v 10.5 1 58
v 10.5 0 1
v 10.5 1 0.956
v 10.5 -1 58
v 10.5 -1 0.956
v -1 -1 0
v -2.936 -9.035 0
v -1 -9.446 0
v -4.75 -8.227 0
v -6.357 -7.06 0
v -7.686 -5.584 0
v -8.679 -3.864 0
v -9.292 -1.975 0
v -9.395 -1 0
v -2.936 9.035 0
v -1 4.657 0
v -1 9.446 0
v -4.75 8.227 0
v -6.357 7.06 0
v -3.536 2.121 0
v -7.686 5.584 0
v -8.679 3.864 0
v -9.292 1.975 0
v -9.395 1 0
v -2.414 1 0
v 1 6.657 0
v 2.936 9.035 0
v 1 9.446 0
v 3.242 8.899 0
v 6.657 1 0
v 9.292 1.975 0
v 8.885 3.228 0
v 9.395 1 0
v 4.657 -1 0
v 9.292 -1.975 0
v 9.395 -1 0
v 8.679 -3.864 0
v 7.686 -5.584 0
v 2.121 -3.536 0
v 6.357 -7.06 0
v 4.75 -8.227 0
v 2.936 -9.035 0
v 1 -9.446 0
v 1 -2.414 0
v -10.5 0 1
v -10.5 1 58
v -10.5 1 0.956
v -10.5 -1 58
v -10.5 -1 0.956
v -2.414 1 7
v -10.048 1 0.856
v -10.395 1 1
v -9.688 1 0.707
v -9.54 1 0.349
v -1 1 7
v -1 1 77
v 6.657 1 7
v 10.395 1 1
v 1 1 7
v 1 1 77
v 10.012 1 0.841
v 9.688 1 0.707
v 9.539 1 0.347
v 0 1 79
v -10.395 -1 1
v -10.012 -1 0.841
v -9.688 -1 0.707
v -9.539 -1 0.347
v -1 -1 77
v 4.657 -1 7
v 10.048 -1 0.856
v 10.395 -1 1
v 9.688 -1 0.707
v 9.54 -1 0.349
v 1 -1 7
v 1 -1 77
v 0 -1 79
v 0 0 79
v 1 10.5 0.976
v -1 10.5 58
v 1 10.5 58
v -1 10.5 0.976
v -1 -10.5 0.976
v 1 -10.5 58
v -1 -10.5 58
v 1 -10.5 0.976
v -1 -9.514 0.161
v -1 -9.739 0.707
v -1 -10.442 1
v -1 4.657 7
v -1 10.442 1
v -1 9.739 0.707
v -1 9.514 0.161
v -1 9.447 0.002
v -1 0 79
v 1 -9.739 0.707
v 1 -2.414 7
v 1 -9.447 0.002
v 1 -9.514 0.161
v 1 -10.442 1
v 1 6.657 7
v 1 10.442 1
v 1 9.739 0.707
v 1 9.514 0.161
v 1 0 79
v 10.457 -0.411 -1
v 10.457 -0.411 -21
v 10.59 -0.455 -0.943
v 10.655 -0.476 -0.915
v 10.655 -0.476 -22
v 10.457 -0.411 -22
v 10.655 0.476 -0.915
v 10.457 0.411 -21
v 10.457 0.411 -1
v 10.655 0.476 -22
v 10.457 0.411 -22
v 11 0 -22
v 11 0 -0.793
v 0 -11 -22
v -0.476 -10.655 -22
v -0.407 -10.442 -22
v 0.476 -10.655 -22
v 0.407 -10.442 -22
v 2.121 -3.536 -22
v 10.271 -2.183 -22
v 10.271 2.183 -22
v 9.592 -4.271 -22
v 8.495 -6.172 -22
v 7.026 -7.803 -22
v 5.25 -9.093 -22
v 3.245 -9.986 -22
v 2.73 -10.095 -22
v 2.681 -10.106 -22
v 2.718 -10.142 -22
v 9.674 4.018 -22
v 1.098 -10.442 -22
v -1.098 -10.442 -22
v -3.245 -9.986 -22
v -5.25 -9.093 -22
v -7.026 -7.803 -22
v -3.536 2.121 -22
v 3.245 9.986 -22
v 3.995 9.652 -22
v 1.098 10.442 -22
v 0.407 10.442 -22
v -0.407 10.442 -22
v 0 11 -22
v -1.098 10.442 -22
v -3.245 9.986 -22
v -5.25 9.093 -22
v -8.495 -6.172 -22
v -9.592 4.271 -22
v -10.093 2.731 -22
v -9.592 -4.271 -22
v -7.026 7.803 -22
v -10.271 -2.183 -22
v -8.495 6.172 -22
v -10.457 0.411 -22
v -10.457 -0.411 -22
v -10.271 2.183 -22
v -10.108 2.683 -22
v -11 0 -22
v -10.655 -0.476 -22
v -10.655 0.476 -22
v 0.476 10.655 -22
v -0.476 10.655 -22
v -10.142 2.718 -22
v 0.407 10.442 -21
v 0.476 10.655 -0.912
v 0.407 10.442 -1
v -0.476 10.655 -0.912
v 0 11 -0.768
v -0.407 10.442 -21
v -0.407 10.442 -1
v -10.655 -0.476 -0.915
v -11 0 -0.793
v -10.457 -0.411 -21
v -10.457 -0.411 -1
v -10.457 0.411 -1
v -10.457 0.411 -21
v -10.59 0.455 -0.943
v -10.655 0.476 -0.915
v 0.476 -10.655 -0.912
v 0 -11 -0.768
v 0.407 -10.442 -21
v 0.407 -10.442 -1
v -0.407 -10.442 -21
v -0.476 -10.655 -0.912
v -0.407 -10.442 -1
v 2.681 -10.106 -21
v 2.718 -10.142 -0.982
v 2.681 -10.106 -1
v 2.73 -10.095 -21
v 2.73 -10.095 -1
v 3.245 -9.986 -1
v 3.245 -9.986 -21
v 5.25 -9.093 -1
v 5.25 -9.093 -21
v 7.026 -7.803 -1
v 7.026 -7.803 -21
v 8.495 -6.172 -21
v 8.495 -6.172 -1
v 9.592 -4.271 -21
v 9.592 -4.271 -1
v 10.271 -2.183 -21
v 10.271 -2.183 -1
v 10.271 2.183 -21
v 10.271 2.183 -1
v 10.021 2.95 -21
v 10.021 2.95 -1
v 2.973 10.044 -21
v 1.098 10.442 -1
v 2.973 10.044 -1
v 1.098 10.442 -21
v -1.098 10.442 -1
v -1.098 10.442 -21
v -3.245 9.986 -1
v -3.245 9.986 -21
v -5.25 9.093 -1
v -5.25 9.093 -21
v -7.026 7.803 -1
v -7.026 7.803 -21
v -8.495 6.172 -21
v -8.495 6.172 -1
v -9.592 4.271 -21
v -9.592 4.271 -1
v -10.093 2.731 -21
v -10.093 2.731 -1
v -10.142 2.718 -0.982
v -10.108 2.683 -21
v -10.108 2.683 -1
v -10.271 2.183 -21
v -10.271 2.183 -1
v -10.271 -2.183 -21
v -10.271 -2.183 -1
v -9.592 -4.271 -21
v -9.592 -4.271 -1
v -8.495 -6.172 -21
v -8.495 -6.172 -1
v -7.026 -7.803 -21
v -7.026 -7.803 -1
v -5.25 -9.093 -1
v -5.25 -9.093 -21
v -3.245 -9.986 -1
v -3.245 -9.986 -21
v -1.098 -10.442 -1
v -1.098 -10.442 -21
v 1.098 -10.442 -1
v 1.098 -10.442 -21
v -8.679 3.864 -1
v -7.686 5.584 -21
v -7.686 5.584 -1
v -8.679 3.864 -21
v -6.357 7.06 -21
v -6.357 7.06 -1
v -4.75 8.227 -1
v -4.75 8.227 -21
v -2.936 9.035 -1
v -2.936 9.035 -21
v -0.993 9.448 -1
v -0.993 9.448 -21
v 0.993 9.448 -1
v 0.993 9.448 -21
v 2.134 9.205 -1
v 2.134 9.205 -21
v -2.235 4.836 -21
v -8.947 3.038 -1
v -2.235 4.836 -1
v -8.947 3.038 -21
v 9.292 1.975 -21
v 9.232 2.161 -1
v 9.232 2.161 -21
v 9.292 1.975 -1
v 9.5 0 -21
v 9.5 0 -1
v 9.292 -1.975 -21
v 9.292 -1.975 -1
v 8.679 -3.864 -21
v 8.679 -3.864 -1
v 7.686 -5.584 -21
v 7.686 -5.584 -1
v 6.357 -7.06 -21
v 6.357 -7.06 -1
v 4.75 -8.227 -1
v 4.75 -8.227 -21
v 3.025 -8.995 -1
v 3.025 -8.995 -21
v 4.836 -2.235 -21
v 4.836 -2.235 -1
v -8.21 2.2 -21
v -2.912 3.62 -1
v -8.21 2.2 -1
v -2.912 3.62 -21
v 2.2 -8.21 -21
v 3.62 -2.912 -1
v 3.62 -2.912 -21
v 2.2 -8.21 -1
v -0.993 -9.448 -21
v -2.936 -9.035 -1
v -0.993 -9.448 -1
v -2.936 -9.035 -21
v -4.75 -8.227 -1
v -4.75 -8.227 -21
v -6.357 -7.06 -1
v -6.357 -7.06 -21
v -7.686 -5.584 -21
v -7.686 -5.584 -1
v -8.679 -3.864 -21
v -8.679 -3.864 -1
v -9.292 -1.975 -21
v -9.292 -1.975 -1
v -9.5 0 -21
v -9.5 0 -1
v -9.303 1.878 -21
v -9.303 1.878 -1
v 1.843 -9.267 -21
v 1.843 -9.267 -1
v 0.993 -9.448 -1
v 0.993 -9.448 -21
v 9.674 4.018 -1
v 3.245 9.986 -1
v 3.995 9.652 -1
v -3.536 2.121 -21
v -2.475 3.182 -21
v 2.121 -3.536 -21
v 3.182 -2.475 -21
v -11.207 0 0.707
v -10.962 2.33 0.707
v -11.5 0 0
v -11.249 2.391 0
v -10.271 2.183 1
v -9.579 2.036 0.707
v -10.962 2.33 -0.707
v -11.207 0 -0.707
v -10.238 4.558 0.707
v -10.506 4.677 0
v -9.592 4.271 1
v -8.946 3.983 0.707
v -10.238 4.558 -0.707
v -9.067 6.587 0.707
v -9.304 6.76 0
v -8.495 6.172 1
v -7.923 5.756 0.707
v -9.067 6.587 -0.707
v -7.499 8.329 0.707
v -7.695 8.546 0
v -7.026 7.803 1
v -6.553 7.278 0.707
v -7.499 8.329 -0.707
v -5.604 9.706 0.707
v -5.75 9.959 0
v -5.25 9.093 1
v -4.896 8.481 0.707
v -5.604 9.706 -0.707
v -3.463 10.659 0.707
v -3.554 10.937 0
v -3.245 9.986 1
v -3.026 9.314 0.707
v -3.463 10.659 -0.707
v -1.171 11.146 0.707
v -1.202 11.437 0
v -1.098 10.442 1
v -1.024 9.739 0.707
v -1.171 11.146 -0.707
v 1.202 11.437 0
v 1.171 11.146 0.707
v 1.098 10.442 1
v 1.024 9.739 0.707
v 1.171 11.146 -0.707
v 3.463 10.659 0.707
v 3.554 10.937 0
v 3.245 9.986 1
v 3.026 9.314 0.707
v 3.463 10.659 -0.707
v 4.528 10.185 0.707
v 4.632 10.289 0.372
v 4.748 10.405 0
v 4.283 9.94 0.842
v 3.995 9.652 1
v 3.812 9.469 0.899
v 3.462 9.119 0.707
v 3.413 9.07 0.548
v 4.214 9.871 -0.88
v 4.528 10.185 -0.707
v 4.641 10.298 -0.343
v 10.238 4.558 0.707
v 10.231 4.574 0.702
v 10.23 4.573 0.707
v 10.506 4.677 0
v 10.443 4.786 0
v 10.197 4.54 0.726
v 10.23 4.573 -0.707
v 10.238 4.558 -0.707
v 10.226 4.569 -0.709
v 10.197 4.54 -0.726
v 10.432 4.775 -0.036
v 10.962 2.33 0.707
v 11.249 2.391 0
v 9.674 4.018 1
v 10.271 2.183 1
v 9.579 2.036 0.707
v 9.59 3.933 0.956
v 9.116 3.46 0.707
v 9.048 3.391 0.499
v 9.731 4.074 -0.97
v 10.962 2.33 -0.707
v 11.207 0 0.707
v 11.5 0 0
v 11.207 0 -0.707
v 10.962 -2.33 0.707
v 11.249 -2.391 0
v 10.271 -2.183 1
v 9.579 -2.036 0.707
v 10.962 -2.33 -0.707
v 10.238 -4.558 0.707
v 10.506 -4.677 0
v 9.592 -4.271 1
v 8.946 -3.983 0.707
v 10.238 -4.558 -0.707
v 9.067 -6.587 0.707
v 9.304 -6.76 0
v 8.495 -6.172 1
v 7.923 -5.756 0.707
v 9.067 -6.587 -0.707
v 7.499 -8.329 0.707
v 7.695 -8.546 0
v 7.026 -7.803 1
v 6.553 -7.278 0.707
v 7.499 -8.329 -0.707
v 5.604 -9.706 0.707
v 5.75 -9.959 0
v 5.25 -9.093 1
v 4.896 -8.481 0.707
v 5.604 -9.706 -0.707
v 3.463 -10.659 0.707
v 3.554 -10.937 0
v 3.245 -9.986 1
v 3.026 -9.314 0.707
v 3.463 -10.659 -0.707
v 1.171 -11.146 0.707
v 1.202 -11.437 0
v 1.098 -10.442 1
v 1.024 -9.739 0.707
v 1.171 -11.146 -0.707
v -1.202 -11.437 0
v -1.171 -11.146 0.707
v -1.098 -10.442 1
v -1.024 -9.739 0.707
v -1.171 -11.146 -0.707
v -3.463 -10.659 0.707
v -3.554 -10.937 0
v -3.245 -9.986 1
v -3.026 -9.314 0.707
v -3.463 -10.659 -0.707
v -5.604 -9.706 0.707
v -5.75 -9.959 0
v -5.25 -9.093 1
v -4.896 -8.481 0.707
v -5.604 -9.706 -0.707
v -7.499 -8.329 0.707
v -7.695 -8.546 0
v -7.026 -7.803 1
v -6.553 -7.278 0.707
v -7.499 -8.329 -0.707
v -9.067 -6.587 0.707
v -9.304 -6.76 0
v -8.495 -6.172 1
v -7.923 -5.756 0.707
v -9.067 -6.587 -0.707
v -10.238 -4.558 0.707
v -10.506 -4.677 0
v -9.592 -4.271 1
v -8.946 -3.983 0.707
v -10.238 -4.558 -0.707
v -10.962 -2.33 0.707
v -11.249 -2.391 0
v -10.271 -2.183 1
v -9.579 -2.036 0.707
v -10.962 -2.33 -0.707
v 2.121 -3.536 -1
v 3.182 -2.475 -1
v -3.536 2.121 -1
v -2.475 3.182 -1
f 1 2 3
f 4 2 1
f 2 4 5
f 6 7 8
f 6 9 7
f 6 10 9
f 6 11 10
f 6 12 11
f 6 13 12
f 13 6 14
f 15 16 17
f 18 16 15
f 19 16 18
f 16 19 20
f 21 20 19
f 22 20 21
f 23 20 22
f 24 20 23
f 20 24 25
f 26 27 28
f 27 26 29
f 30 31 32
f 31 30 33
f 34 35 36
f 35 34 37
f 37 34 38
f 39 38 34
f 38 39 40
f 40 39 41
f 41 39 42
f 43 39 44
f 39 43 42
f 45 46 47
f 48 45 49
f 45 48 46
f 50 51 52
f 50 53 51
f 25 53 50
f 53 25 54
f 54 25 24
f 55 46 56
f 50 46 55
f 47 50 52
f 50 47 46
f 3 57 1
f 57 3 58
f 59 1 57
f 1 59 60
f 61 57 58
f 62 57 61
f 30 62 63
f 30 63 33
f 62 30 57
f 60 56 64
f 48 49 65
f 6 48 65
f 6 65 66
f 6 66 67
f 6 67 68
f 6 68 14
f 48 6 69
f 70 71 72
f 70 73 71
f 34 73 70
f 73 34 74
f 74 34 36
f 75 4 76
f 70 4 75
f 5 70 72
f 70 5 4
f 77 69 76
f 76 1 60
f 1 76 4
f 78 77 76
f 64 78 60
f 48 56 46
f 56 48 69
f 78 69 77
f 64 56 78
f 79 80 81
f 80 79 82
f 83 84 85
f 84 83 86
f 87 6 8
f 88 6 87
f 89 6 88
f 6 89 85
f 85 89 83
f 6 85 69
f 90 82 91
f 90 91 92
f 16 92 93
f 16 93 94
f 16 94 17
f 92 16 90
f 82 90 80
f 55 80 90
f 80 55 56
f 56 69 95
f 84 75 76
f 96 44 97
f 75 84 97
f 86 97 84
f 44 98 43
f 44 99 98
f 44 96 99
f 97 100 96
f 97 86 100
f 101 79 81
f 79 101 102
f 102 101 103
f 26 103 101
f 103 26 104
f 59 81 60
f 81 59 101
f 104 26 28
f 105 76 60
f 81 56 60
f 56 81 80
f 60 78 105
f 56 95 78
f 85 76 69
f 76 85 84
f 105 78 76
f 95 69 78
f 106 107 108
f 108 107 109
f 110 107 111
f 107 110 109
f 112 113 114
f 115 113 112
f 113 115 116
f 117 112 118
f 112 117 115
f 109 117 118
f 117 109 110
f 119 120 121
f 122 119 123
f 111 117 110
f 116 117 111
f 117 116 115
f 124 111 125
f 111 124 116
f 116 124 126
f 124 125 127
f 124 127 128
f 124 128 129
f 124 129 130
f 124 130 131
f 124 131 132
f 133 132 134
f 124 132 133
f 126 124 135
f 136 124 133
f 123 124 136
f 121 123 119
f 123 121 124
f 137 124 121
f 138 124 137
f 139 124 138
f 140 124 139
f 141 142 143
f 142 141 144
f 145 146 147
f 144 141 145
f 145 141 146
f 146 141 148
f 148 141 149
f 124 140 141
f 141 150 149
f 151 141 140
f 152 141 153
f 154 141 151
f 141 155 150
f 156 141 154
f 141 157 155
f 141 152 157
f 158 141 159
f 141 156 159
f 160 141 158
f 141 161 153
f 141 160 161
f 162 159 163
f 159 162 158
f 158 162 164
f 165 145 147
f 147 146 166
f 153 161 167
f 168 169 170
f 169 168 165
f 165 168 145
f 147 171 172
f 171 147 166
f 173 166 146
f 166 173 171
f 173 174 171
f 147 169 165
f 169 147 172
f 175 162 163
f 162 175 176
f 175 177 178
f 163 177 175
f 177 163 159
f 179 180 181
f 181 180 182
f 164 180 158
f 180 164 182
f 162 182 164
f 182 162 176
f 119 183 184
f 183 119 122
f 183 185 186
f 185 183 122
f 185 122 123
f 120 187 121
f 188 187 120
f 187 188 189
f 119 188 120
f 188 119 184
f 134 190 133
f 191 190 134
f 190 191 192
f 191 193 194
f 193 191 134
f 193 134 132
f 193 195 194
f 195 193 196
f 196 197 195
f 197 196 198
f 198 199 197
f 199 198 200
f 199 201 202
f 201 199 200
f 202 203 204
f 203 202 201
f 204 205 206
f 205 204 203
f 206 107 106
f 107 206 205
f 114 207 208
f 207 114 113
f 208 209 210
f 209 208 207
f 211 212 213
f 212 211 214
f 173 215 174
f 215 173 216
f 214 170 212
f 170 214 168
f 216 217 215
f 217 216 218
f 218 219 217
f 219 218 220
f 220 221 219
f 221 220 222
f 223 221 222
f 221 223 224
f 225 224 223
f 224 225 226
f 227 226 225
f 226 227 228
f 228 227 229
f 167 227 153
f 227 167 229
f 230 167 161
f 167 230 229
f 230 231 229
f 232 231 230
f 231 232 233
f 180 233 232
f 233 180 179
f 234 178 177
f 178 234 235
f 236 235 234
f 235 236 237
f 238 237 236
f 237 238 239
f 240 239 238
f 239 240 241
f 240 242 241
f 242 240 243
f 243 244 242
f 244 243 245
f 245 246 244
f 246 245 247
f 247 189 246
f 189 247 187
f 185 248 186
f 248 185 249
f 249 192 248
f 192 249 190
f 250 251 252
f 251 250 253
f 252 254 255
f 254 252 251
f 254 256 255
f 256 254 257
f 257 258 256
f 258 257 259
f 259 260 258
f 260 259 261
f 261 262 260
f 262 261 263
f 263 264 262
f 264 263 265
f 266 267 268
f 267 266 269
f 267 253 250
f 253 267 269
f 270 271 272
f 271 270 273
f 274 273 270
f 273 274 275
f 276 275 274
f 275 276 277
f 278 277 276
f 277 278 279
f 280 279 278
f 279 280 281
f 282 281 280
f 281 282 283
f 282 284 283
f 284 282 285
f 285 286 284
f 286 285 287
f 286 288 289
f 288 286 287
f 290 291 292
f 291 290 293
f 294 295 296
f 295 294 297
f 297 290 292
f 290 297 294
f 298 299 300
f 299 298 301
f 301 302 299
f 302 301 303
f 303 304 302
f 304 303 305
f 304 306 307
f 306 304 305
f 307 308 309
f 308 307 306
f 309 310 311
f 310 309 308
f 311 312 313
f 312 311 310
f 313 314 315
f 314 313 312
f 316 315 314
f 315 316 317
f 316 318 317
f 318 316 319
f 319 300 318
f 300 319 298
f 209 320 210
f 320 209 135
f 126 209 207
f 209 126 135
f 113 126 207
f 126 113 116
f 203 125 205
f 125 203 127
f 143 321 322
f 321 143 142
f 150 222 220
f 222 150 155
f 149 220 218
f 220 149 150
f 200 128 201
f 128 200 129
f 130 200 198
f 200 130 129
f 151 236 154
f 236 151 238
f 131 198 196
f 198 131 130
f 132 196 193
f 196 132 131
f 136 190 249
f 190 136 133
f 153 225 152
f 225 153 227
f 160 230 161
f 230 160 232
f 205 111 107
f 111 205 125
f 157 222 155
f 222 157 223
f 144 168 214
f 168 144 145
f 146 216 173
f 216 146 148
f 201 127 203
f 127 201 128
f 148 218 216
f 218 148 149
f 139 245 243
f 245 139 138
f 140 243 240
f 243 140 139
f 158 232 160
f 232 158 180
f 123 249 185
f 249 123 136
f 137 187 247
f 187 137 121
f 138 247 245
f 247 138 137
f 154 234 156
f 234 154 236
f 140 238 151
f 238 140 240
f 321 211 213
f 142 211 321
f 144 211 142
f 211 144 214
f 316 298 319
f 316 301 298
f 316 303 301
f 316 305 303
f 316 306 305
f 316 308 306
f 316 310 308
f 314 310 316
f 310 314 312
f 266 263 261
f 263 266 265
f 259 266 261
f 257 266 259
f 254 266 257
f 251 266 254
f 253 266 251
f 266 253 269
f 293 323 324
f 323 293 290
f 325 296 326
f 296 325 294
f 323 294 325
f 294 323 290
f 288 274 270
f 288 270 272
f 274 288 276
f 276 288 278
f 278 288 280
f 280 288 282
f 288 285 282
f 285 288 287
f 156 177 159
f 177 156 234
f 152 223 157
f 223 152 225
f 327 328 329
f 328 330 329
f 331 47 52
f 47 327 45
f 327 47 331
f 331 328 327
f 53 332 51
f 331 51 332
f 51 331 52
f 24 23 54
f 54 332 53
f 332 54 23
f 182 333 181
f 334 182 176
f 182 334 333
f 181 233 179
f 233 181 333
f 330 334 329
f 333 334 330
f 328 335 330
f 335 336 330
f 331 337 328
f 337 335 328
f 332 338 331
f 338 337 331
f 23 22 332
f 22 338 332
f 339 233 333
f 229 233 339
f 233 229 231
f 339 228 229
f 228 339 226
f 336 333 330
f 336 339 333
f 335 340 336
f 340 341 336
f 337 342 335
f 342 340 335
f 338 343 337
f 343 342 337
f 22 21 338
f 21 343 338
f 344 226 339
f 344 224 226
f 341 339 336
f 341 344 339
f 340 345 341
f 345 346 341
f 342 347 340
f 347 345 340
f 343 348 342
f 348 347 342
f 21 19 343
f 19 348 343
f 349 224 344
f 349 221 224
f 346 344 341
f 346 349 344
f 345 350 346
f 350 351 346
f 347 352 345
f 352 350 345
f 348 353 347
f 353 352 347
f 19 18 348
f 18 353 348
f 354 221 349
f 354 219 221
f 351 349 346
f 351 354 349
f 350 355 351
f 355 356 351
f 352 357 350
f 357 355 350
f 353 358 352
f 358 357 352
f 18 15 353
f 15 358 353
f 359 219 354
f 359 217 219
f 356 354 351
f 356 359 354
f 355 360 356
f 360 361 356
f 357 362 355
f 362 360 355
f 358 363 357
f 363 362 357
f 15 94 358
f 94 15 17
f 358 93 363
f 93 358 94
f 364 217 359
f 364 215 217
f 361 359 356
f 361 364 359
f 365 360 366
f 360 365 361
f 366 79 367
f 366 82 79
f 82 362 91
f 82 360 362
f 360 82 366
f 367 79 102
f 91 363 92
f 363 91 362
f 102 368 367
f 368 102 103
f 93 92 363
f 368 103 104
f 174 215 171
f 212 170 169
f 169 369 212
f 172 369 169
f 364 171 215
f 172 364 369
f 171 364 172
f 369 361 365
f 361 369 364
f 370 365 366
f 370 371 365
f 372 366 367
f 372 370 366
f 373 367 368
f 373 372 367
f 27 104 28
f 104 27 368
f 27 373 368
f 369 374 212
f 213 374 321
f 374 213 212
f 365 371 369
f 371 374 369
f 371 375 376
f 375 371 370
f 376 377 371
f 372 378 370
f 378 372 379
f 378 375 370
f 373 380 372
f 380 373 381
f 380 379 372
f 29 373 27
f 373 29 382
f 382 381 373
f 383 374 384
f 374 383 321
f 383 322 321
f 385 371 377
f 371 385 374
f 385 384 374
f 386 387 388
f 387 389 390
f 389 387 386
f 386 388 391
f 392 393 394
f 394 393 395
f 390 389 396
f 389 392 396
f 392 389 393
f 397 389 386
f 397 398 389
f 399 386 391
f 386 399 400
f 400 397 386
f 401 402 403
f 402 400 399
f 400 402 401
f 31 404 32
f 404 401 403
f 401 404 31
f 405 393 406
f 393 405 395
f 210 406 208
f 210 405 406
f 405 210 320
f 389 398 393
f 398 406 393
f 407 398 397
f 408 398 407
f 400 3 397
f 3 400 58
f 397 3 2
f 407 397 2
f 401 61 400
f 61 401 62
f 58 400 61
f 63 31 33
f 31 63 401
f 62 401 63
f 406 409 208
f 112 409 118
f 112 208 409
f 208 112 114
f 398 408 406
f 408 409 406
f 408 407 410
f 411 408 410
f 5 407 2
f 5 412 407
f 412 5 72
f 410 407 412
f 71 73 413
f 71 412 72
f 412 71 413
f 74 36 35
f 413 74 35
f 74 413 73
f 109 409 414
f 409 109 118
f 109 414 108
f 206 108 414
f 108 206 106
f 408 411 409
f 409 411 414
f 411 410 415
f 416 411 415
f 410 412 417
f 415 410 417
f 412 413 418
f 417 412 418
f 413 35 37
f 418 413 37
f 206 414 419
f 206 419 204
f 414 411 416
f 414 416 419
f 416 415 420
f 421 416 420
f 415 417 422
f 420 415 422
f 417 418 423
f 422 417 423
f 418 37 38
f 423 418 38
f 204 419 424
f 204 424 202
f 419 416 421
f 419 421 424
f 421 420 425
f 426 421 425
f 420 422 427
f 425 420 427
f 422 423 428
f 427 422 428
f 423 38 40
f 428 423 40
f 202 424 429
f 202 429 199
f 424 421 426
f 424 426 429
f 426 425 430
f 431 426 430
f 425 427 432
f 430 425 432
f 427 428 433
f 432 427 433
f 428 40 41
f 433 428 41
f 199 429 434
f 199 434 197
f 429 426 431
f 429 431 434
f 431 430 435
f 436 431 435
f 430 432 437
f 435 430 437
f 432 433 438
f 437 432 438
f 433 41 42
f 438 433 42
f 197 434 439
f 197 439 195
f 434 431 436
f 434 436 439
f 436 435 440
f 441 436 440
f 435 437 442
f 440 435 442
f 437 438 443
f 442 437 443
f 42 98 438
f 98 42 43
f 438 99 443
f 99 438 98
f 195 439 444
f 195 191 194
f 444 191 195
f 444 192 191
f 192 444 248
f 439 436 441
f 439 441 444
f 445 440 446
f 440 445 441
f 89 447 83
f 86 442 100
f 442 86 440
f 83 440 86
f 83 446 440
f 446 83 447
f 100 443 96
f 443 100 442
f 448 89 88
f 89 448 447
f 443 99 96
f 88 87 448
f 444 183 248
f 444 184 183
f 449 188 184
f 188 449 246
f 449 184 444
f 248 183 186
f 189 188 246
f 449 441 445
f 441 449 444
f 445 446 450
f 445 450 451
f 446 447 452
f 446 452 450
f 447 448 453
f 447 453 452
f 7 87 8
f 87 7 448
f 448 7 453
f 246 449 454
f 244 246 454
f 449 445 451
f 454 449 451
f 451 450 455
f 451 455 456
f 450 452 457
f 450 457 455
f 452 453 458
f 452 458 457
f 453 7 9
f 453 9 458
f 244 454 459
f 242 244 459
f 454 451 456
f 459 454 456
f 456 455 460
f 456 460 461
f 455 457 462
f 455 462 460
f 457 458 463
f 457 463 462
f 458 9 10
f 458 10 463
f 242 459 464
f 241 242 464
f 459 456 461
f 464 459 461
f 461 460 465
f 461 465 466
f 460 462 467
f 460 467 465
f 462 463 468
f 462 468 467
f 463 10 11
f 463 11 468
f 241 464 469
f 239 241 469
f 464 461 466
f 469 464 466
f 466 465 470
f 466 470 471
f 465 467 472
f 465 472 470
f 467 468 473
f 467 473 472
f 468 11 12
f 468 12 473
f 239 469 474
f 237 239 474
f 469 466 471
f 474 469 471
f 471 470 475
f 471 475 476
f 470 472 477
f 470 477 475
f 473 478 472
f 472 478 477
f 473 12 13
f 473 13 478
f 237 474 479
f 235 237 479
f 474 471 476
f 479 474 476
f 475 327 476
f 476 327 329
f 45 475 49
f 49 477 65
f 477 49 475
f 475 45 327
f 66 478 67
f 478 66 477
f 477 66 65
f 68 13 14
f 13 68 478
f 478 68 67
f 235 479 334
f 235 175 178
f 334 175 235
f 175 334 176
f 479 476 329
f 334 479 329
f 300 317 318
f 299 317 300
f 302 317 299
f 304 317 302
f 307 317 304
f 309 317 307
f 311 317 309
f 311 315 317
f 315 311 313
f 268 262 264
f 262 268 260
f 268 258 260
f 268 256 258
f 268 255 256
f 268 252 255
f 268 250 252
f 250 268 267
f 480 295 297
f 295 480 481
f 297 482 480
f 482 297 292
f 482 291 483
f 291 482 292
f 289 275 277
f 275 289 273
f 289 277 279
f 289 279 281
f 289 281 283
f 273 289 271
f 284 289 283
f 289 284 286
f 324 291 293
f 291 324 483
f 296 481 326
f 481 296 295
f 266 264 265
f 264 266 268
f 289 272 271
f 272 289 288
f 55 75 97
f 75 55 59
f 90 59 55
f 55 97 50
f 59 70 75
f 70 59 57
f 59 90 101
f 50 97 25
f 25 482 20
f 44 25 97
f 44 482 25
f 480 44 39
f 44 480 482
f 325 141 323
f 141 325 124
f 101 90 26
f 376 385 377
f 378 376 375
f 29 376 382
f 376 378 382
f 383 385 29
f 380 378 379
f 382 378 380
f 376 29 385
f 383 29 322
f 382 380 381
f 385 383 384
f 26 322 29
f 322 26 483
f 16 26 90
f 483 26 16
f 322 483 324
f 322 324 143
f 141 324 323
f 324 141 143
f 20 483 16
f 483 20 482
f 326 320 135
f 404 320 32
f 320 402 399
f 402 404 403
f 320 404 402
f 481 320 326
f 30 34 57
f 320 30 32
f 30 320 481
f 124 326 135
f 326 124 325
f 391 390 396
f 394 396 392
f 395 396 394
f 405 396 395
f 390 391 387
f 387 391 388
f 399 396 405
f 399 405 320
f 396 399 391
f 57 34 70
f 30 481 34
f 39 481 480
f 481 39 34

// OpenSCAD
/*
    A ground spike for garden lights with a gap for electric cable to pass up the shaft.

    I bought some lovely solar powered garden light
    (Just for £2 - a bargain for a stainless steel and glass construction!)
    buy I also wanted wire them to a 12V supply, so they could illuminate the whole garden.
    The 12V cable is quite thick, and the existing ground spikes couldn't accomodate the cable.

Print Notes
===========

I printed these with PLA, but ABS would be a much better choice, as PLA may deteriorate in the ground.

*/
module groundSpike( d=21, l= 100, peg=22, thickness=2 )
{

    module half()
    {
        translate( [-d/2,-thickness/2,0] ) cube( [ d, thickness, l-d*2 ] );
        translate( [0,-thickness/2,l-d*2] ) scale( [1,1,2] ) rotate( [-90, 0,0] ) cylinder( $fn=4, d=d, h=thickness );
    }

    module ridge() {
        translate( [d/2,0,-peg] ) cylinder( d=1, h=peg );
    }
    
    translate( [0,0,-peg] ) linear_extrude( peg, convexity=10 ) {
        difference() {
            circle( d=d );
            circle( d=d-thickness );
        }
        rotate(45) difference() {
            circle( $fn=3, d=d, l=peg );
            circle( $fn=3, d=d-thickness*2, l=peg );
        }
    }   

    translate([0,0,-peg]) cylinder( d=d, h=1 );

    half();
    rotate( [0,0,90] ) half();
    
    rotate_extrude() translate( [d/2,0,0] ) circle( d=2, $fn=8 );
    translate( [0,0,-1] ) cylinder( d=d, h=1 );
    
    for (i = [0:3]) {
        rotate([0,0,i*90]) ridge();
    }
}

module wiredGroundSpike(  d=21, l= 100, peg=22, thickness=2, gap=8 )
{
    difference() {
        union() {
            groundSpike( d=d, l=l, peg=peg, thickness=thickness);
        
            intersection() {
                rotate(45) translate( [d/2-gap-thickness,-gap/2-thickness/2,-peg] ) cube( [d,gap+thickness,peg] );
                translate( [0,0,-peg] ) cylinder( d=d,h=peg );
            }
        }
        
        rotate([0,0,45]) translate( [-1,-gap/2,-peg-1] ) cube( [d, gap, peg+gap] );
    }
}

wiredGroundSpike();
